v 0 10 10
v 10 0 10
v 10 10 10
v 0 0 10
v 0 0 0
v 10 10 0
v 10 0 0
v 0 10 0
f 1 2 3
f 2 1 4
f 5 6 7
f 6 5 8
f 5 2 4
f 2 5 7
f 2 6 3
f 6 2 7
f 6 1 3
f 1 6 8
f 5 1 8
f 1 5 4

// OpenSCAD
// model25: complex expression evaluation (ternary, comparison)
x = 5 > 3 ? 10 : 20;
cube(x);
